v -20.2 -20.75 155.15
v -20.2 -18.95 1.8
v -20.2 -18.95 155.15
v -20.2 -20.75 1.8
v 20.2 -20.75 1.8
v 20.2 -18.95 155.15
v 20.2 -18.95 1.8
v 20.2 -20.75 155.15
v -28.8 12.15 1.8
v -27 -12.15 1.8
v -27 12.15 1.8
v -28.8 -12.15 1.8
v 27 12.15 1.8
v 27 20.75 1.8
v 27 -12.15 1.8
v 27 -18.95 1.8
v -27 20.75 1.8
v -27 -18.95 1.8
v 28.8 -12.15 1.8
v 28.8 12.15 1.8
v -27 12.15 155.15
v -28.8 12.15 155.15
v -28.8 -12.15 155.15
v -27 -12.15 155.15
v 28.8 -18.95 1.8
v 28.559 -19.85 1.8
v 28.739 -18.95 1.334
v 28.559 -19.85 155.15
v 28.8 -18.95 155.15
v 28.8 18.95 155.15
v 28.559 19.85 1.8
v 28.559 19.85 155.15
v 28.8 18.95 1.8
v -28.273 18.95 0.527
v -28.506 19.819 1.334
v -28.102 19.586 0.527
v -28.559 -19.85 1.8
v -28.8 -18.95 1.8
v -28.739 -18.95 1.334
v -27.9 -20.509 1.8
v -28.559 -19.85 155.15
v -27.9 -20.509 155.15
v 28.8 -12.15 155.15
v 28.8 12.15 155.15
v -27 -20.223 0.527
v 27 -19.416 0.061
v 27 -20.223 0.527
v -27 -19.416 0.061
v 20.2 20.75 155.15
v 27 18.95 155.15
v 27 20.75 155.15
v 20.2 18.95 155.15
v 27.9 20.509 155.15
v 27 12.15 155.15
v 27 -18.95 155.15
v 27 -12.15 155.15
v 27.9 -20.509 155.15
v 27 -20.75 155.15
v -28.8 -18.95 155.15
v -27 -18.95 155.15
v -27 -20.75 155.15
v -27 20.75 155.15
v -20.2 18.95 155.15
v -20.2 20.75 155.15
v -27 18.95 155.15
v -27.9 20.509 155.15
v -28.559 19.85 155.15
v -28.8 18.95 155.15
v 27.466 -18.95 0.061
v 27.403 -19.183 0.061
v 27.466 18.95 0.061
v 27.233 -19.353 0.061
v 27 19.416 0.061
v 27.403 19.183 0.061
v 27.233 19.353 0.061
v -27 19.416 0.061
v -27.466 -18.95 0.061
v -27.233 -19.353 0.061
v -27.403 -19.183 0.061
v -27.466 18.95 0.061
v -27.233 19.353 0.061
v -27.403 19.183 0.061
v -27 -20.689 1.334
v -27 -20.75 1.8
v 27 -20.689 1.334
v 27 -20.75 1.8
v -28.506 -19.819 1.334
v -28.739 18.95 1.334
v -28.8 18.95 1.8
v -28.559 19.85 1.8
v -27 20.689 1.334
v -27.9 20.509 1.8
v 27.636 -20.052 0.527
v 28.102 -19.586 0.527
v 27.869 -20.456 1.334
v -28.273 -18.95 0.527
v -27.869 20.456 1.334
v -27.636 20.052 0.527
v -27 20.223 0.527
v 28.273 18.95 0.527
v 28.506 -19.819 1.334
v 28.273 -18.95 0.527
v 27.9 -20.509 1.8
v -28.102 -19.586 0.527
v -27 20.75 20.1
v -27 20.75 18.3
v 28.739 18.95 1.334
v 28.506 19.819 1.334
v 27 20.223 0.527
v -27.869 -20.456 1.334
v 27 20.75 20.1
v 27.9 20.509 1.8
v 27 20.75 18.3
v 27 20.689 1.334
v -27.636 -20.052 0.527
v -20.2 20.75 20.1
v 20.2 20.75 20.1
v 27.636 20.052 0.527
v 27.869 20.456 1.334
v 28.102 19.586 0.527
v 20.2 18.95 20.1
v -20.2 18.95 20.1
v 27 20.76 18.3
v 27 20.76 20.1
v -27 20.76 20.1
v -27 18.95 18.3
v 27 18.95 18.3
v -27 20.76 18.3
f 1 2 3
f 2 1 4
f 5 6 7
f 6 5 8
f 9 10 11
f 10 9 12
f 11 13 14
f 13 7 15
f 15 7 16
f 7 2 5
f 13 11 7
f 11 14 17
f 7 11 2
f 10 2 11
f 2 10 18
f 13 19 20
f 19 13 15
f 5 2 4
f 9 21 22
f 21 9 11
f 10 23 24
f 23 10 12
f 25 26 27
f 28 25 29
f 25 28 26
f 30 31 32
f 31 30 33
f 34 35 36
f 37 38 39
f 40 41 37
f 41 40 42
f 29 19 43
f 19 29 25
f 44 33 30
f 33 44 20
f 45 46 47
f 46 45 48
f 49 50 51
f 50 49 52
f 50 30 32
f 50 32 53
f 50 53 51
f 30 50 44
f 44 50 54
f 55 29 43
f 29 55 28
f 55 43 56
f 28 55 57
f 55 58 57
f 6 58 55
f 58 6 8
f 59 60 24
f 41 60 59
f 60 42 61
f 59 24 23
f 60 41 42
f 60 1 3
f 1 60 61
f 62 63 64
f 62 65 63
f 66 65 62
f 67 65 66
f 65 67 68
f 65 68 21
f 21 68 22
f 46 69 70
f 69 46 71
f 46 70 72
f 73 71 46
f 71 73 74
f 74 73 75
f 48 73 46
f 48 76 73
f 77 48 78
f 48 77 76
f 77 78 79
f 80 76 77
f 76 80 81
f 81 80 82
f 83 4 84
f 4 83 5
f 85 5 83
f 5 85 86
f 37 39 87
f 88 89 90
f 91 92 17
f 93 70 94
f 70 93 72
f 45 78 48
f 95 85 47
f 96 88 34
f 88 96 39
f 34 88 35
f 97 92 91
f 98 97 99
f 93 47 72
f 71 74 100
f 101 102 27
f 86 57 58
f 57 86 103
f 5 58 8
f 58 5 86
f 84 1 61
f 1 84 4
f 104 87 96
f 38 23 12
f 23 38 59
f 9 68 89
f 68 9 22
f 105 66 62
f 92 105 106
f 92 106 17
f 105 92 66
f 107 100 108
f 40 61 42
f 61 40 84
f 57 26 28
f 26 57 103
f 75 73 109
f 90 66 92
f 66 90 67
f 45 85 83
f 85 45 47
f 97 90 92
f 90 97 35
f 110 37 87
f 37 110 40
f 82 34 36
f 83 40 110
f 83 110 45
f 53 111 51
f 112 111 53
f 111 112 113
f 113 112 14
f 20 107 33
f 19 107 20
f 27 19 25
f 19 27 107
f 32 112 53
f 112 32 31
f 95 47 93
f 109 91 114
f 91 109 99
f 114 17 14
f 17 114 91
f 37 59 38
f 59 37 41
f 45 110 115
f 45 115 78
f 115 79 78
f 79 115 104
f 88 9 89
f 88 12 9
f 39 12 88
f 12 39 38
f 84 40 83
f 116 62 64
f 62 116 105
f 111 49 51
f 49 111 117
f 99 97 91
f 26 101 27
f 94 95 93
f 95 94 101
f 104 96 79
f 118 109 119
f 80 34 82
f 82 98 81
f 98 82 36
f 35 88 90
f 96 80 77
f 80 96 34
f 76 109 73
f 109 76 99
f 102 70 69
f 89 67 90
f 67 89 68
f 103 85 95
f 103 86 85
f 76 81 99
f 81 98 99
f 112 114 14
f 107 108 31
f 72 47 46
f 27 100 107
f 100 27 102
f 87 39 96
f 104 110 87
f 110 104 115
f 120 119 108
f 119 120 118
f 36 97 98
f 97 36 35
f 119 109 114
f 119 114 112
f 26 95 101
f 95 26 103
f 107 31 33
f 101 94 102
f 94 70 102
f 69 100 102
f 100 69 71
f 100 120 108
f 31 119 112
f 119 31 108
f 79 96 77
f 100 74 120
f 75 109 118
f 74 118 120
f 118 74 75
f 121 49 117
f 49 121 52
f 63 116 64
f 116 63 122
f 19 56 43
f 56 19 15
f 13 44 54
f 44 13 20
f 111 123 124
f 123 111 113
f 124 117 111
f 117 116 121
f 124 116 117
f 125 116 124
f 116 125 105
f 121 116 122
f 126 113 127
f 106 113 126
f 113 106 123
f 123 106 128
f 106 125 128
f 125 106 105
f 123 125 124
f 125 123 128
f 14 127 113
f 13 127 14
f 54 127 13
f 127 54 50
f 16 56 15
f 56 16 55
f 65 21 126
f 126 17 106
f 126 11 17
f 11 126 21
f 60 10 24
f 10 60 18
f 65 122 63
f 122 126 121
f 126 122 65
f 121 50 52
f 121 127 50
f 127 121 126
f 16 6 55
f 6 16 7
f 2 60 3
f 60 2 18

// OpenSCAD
// -*- mode: SCAD ; c-file-style: "ellemtel" ; coding: utf-8 -*-
//
// matchbox stacker with or without a perch for the one box in use
//
// © 2018–2019 Roland Sieker <ospalh@gmail.com>
// Licence: CC-BY-SA 4.0

/* [Global] */

// Which variant of the stacker to create
variant = "s"; // [s: simple, p: with perch, c: with container]

// Set this to “render” and click on “Create Thing” when done with the setup.
preview = 1; // [0:render, 1:preview]

/* [Sizes] */

//
box_width = 53.2;  // [5:0.1:150]
box_height = 16.1;  // [5:0.1:30]
box_depth = 37.1;  // [5:0.1:80]
boxes_per_pack = 10;  // [4:1:20]

/* [Hidden] */

// Done with the customizer

// *******************************************************
// Extra parameters. These can be changed reasonably safely.


w = 1.8;  // Wall width
// p = 1.2;  // Bottom, top plate height
p = w;  // Bottom, top plate height
c = 0.4;  // Clearance
angle = 60; // Overhangs much below 60° are a problem for me
k = 5;  // which of the remainig main plates
r_c = k/2;  // Radius of the main cuts
p_f = 0.5; // perch factor. How long the perch is as part of the width
c_f = 0.5;  // container factor. How long the perch is as part of the width
sp_w = 3.3; // How much the inner box is less wide than the outer
sp_h = 2.4; // How much the inner box is less high than the outer


// *******************************************************
// Some shortcuts. These shouldn’t be changed

tau = 2 * PI;  // π is still wrong. τ = circumference / r

xy_factor = 1/tan(angle);
// To get from a height to a horizontal width inclined correctly
z_factor = tan(angle);  // The other way around

r_r = min(w,p);
w_e = box_width + 2*c;
d_e = box_depth + 2*c;
h_e = (boxes_per_pack - ( (variant == "s") ? 0.5 : 1) ) * box_height + c;


xe = w_e/2 + w - r_r;
ye = d_e/2 + w - r_r;

xex = xe - r_c - k;
yex = ye - r_c - k;



some_distance = 1.5 * box_width;
ms = 0.01;  // Muggeseggele.

h_ee = h_e + c + p + 2 * ms;
// fn for differently sized objects and fs, fa; all for preview or rendering.
pna = 40;
pnb = 15;
pa = 5;
ps = 1;
rna = 180;
rnb = 30;
ra = 2;
rs = 0.25;
function na() = (preview) ? pna : rna;
function nb() = (preview) ? pnb : rnb;
$fs = (preview) ? ps : rs;
$fa = (preview) ? pa : ra;

// *******************************************************
// End setup



// *******************************************************
// Generate the parts

print_part();
// preview_parts();
// stack_parts();

module print_part()
{
   if ("s" == variant)
   {
      simple_stacker();
   }
   if ("p" == variant)
   {
      stacker_with_perch();
   }
   if ("c" == variant)
   {
      stacker_with_container();
   }
}

module preview_parts()
{
   simple_stacker();
   translate([some_distance, 0, 0])
   {
      stacker_with_perch();
   }
   translate([0, some_distance, 0])
   {
      stacker_with_container();
   }
}


// *******************************************************
// Code for the parts themselves
module simple_stacker()
{
   difference()
   {
      union()
      {
         solid_main_box();
         single_matchbox_bar();
      }
      matches_hollow();
      single_matchbox_hole();
   }
}

module single_matchbox_bar()
{
   translate([-w_e/2, d_e/2-ms, p+box_height+c])
   {
      cube([w_e,w+2*ms,w]);
   }
}

module single_matchbox_hole()
{
   translate([-w_e/2, d_e/2-ms, p])
   {
      cube([w_e,w+2*ms,+box_height+c]);
   }
}

module matches_hollow()
{
   translate([0,0,h_ee/2+p])
   {
      cube([w_e, d_e, h_ee], center=true);
   }
}

module solid_main_box()
{
   difference()
   {
      simple_solid_box();
      x_cut();
      y_cut();
      rotate(180)
      {
         x_cut();
         y_cut();
      }
   }
   module x_cut()
   {
      hull()
      {
         translate([0,0,p])
         {
            translate([xex-w, yex+k, 0])
            {
               cylinder(r=r_c, h=h_ee);
            }
            translate([-xex+w, yex+k, 0])
            {
               cylinder(r=r_c, h=h_e + c + p+ 2 * ms);
            }
            translate([0, d_e, h_ee/2])
            {
               cube([2*xex-2*w+2*r_c, 1, h_ee], center=true);
            }
         }
      }
   }
   module y_cut()
   {
      hull()
      {
         translate([0,0,p])
         {
            translate([xex+k, yex-w, 0])
            {
               cylinder(r=r_c, h=h_ee);
            }
            translate([xex+k, -yex+w, 0])
            {
               cylinder(r=r_c, h=h_e + c + p+ 2 * ms);
            }
            translate([w_e, 0, h_ee/2])
            {
               cube([1, 2*yex-2*w+2*r_c, h_ee], center=true);
            }
         }
      }
   }
}

module simple_solid_box()
{
   hull()
   {
      translate([xe, ye,0])
      {
         stick();
      }
      translate([xe, -ye,0])
      {
         stick();
      }
      translate([-xe, ye,0])
      {
         stick();
      }
      translate([-xe, -ye,0])
      {
         stick();
      }
   }
   module stick()
   {
      translate([0,0,r_r])
      {
         sphere(r=r_r);
         cylinder(r=r_r, h_e);
      }
   }
}
